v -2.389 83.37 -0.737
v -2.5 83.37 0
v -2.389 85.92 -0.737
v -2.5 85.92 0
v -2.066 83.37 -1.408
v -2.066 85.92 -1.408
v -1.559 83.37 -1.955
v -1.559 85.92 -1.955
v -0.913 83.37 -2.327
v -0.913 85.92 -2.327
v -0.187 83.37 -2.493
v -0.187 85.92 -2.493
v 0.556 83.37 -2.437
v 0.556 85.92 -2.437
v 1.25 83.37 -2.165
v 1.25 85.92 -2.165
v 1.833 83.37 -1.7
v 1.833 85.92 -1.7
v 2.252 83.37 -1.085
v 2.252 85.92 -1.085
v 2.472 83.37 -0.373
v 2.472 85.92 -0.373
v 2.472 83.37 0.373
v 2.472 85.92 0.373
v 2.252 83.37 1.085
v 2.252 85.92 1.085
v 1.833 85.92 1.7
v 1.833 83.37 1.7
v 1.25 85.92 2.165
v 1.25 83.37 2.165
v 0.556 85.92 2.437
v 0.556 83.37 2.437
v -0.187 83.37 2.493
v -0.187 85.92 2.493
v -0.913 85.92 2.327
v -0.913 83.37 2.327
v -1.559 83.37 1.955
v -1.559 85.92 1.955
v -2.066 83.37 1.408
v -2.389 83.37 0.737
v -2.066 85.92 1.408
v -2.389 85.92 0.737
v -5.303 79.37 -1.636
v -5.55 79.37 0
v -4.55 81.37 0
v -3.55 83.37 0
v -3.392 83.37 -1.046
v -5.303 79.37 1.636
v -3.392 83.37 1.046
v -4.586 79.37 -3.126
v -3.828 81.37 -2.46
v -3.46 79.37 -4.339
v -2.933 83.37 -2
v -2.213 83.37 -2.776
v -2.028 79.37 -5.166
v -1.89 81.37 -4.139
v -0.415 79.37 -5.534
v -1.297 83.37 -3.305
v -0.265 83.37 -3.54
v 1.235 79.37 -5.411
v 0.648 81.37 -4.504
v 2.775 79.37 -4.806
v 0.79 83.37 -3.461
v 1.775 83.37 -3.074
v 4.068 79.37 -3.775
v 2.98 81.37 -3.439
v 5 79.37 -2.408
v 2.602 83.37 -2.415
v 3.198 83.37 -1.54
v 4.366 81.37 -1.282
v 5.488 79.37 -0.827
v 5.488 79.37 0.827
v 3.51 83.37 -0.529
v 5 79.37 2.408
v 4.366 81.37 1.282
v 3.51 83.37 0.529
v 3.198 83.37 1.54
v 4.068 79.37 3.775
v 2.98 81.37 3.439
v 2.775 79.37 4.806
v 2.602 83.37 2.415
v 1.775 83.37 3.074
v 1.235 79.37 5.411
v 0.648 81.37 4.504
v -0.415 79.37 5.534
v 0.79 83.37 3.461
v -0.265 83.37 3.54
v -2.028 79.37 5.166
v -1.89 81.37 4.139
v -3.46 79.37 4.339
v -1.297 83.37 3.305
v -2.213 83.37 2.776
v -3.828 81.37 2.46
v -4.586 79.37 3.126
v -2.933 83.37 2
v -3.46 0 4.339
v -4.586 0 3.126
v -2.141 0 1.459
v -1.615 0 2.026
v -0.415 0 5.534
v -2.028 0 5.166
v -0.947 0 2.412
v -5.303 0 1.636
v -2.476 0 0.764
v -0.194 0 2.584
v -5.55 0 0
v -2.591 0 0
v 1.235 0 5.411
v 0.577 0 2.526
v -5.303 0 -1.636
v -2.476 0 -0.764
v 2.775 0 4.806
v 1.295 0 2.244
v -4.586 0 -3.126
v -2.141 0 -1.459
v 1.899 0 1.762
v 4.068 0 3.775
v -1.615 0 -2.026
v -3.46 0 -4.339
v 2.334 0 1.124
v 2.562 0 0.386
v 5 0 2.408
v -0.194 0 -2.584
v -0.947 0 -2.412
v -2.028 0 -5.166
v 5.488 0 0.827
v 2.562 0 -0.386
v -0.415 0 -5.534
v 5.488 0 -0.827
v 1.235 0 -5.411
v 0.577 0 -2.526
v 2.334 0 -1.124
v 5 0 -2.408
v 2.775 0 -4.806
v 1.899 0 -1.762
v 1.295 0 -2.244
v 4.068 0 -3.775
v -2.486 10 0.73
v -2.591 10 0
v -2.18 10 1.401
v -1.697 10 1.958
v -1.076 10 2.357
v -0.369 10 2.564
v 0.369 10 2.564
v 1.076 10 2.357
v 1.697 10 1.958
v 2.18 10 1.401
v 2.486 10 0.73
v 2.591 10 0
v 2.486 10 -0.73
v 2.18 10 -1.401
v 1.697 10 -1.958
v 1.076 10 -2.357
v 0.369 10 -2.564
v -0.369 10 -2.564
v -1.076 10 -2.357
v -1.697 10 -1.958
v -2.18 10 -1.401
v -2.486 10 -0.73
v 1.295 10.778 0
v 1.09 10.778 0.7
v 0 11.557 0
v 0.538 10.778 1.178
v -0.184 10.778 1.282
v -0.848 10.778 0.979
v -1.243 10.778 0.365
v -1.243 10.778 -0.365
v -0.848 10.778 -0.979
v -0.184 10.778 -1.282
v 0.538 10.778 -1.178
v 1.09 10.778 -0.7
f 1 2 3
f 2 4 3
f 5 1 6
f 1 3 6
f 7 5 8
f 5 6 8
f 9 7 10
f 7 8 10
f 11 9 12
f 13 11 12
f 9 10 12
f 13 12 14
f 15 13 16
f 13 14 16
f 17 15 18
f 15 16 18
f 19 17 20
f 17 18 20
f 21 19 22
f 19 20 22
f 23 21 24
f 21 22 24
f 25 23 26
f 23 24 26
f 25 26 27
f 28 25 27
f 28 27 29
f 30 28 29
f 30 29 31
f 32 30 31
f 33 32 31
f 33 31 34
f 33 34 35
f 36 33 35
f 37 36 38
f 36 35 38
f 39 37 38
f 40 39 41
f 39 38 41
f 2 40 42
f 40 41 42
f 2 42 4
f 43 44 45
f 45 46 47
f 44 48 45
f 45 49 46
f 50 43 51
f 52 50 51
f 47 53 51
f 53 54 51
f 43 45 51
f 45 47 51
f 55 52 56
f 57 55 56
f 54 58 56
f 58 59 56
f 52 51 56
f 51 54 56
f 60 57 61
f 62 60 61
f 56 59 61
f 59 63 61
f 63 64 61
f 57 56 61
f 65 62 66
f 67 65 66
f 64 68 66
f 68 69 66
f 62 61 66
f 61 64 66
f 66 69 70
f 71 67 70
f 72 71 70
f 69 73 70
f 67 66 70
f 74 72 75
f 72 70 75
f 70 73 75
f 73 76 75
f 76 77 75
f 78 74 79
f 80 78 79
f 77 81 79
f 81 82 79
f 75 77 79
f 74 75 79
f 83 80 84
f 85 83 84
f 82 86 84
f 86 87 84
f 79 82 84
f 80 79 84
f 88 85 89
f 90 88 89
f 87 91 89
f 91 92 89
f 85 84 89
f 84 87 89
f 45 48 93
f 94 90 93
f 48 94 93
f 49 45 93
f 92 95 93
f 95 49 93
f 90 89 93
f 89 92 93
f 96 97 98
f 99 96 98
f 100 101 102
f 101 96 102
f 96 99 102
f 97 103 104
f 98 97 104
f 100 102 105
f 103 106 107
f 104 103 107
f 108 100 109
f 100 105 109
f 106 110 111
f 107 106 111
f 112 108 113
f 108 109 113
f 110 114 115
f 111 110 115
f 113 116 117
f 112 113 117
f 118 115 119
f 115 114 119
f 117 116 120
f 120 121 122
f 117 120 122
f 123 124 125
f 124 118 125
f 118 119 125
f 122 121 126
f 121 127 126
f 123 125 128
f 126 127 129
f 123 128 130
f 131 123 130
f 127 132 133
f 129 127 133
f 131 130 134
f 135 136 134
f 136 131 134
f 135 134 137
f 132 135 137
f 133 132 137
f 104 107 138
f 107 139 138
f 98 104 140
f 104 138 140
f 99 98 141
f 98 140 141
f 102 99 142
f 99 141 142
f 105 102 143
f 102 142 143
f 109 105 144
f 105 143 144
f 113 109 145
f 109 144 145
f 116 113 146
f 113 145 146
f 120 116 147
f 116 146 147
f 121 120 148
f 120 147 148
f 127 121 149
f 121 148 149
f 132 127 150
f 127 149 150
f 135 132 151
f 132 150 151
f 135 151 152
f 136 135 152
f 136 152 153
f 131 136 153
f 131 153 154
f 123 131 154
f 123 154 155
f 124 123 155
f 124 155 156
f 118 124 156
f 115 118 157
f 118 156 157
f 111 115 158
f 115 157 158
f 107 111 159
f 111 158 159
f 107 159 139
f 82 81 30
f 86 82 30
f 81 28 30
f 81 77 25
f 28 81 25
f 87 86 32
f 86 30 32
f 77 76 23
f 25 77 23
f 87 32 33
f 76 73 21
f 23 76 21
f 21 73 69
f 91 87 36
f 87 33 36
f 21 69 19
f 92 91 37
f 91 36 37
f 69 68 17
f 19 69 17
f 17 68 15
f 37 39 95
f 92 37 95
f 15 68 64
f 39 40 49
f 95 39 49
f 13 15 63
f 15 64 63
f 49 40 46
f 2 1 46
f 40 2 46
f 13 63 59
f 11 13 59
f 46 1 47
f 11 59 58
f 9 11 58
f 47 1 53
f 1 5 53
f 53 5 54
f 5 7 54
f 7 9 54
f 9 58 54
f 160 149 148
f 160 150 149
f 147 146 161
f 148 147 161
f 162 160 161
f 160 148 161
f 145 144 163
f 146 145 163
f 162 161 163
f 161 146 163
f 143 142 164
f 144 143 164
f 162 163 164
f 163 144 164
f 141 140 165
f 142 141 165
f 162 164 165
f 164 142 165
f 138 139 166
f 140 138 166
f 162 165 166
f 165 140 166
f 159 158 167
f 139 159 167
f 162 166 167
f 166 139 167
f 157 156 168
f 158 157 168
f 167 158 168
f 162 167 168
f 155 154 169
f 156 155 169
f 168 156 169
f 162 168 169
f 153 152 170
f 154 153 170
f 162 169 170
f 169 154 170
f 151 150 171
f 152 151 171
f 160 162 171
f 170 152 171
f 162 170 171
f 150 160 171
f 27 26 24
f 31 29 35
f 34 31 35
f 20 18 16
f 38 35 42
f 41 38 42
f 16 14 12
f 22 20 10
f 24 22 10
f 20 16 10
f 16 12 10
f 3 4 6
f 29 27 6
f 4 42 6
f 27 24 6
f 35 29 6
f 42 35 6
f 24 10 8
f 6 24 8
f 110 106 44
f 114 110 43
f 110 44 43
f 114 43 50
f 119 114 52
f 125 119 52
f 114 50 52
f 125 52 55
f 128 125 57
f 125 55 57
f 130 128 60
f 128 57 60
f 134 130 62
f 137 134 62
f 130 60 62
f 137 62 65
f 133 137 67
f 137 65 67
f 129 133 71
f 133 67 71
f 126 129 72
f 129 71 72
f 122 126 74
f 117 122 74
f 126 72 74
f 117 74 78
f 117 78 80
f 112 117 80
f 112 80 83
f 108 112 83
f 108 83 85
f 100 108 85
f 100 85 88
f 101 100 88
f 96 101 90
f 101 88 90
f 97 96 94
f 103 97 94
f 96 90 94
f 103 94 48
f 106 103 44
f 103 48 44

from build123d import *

# Parameters (mm, degrees)
F_6_0_204_DIAMETER_HOLE1_D     = 5.1816
F_6_0_204_DIAMETER_HOLE1_DEPTH = 10
F_6_0_204_DIAMETER_HOLE1_TIP   = 1.556709692


with BuildPart() as part:
    # Sketch1 → Revolve1 (revolve)
    with BuildSketch(Plane.XY):
        Polygon((0, 0), (-5.55, 0), (-5.55, 79.37), (-3.55, 83.37), (-2.5, 83.37), (-2.5, 85.92), (0, 85.92), align=None)
    revolve(axis=Axis((0, 90.216, 0), (0, -1, 0)))

    # #6 (0.204) Diameter Hole1
    with Locations(Plane.XZ):
        with Locations((0, 0)):
            Hole(F_6_0_204_DIAMETER_HOLE1_D / 2, depth=F_6_0_204_DIAMETER_HOLE1_DEPTH)
            with Locations((0, 0, -(F_6_0_204_DIAMETER_HOLE1_DEPTH + F_6_0_204_DIAMETER_HOLE1_TIP / 2))):  # 118° drill point
                Cone(0, F_6_0_204_DIAMETER_HOLE1_D / 2, F_6_0_204_DIAMETER_HOLE1_TIP, mode=Mode.SUBTRACT)


solid = part.part
